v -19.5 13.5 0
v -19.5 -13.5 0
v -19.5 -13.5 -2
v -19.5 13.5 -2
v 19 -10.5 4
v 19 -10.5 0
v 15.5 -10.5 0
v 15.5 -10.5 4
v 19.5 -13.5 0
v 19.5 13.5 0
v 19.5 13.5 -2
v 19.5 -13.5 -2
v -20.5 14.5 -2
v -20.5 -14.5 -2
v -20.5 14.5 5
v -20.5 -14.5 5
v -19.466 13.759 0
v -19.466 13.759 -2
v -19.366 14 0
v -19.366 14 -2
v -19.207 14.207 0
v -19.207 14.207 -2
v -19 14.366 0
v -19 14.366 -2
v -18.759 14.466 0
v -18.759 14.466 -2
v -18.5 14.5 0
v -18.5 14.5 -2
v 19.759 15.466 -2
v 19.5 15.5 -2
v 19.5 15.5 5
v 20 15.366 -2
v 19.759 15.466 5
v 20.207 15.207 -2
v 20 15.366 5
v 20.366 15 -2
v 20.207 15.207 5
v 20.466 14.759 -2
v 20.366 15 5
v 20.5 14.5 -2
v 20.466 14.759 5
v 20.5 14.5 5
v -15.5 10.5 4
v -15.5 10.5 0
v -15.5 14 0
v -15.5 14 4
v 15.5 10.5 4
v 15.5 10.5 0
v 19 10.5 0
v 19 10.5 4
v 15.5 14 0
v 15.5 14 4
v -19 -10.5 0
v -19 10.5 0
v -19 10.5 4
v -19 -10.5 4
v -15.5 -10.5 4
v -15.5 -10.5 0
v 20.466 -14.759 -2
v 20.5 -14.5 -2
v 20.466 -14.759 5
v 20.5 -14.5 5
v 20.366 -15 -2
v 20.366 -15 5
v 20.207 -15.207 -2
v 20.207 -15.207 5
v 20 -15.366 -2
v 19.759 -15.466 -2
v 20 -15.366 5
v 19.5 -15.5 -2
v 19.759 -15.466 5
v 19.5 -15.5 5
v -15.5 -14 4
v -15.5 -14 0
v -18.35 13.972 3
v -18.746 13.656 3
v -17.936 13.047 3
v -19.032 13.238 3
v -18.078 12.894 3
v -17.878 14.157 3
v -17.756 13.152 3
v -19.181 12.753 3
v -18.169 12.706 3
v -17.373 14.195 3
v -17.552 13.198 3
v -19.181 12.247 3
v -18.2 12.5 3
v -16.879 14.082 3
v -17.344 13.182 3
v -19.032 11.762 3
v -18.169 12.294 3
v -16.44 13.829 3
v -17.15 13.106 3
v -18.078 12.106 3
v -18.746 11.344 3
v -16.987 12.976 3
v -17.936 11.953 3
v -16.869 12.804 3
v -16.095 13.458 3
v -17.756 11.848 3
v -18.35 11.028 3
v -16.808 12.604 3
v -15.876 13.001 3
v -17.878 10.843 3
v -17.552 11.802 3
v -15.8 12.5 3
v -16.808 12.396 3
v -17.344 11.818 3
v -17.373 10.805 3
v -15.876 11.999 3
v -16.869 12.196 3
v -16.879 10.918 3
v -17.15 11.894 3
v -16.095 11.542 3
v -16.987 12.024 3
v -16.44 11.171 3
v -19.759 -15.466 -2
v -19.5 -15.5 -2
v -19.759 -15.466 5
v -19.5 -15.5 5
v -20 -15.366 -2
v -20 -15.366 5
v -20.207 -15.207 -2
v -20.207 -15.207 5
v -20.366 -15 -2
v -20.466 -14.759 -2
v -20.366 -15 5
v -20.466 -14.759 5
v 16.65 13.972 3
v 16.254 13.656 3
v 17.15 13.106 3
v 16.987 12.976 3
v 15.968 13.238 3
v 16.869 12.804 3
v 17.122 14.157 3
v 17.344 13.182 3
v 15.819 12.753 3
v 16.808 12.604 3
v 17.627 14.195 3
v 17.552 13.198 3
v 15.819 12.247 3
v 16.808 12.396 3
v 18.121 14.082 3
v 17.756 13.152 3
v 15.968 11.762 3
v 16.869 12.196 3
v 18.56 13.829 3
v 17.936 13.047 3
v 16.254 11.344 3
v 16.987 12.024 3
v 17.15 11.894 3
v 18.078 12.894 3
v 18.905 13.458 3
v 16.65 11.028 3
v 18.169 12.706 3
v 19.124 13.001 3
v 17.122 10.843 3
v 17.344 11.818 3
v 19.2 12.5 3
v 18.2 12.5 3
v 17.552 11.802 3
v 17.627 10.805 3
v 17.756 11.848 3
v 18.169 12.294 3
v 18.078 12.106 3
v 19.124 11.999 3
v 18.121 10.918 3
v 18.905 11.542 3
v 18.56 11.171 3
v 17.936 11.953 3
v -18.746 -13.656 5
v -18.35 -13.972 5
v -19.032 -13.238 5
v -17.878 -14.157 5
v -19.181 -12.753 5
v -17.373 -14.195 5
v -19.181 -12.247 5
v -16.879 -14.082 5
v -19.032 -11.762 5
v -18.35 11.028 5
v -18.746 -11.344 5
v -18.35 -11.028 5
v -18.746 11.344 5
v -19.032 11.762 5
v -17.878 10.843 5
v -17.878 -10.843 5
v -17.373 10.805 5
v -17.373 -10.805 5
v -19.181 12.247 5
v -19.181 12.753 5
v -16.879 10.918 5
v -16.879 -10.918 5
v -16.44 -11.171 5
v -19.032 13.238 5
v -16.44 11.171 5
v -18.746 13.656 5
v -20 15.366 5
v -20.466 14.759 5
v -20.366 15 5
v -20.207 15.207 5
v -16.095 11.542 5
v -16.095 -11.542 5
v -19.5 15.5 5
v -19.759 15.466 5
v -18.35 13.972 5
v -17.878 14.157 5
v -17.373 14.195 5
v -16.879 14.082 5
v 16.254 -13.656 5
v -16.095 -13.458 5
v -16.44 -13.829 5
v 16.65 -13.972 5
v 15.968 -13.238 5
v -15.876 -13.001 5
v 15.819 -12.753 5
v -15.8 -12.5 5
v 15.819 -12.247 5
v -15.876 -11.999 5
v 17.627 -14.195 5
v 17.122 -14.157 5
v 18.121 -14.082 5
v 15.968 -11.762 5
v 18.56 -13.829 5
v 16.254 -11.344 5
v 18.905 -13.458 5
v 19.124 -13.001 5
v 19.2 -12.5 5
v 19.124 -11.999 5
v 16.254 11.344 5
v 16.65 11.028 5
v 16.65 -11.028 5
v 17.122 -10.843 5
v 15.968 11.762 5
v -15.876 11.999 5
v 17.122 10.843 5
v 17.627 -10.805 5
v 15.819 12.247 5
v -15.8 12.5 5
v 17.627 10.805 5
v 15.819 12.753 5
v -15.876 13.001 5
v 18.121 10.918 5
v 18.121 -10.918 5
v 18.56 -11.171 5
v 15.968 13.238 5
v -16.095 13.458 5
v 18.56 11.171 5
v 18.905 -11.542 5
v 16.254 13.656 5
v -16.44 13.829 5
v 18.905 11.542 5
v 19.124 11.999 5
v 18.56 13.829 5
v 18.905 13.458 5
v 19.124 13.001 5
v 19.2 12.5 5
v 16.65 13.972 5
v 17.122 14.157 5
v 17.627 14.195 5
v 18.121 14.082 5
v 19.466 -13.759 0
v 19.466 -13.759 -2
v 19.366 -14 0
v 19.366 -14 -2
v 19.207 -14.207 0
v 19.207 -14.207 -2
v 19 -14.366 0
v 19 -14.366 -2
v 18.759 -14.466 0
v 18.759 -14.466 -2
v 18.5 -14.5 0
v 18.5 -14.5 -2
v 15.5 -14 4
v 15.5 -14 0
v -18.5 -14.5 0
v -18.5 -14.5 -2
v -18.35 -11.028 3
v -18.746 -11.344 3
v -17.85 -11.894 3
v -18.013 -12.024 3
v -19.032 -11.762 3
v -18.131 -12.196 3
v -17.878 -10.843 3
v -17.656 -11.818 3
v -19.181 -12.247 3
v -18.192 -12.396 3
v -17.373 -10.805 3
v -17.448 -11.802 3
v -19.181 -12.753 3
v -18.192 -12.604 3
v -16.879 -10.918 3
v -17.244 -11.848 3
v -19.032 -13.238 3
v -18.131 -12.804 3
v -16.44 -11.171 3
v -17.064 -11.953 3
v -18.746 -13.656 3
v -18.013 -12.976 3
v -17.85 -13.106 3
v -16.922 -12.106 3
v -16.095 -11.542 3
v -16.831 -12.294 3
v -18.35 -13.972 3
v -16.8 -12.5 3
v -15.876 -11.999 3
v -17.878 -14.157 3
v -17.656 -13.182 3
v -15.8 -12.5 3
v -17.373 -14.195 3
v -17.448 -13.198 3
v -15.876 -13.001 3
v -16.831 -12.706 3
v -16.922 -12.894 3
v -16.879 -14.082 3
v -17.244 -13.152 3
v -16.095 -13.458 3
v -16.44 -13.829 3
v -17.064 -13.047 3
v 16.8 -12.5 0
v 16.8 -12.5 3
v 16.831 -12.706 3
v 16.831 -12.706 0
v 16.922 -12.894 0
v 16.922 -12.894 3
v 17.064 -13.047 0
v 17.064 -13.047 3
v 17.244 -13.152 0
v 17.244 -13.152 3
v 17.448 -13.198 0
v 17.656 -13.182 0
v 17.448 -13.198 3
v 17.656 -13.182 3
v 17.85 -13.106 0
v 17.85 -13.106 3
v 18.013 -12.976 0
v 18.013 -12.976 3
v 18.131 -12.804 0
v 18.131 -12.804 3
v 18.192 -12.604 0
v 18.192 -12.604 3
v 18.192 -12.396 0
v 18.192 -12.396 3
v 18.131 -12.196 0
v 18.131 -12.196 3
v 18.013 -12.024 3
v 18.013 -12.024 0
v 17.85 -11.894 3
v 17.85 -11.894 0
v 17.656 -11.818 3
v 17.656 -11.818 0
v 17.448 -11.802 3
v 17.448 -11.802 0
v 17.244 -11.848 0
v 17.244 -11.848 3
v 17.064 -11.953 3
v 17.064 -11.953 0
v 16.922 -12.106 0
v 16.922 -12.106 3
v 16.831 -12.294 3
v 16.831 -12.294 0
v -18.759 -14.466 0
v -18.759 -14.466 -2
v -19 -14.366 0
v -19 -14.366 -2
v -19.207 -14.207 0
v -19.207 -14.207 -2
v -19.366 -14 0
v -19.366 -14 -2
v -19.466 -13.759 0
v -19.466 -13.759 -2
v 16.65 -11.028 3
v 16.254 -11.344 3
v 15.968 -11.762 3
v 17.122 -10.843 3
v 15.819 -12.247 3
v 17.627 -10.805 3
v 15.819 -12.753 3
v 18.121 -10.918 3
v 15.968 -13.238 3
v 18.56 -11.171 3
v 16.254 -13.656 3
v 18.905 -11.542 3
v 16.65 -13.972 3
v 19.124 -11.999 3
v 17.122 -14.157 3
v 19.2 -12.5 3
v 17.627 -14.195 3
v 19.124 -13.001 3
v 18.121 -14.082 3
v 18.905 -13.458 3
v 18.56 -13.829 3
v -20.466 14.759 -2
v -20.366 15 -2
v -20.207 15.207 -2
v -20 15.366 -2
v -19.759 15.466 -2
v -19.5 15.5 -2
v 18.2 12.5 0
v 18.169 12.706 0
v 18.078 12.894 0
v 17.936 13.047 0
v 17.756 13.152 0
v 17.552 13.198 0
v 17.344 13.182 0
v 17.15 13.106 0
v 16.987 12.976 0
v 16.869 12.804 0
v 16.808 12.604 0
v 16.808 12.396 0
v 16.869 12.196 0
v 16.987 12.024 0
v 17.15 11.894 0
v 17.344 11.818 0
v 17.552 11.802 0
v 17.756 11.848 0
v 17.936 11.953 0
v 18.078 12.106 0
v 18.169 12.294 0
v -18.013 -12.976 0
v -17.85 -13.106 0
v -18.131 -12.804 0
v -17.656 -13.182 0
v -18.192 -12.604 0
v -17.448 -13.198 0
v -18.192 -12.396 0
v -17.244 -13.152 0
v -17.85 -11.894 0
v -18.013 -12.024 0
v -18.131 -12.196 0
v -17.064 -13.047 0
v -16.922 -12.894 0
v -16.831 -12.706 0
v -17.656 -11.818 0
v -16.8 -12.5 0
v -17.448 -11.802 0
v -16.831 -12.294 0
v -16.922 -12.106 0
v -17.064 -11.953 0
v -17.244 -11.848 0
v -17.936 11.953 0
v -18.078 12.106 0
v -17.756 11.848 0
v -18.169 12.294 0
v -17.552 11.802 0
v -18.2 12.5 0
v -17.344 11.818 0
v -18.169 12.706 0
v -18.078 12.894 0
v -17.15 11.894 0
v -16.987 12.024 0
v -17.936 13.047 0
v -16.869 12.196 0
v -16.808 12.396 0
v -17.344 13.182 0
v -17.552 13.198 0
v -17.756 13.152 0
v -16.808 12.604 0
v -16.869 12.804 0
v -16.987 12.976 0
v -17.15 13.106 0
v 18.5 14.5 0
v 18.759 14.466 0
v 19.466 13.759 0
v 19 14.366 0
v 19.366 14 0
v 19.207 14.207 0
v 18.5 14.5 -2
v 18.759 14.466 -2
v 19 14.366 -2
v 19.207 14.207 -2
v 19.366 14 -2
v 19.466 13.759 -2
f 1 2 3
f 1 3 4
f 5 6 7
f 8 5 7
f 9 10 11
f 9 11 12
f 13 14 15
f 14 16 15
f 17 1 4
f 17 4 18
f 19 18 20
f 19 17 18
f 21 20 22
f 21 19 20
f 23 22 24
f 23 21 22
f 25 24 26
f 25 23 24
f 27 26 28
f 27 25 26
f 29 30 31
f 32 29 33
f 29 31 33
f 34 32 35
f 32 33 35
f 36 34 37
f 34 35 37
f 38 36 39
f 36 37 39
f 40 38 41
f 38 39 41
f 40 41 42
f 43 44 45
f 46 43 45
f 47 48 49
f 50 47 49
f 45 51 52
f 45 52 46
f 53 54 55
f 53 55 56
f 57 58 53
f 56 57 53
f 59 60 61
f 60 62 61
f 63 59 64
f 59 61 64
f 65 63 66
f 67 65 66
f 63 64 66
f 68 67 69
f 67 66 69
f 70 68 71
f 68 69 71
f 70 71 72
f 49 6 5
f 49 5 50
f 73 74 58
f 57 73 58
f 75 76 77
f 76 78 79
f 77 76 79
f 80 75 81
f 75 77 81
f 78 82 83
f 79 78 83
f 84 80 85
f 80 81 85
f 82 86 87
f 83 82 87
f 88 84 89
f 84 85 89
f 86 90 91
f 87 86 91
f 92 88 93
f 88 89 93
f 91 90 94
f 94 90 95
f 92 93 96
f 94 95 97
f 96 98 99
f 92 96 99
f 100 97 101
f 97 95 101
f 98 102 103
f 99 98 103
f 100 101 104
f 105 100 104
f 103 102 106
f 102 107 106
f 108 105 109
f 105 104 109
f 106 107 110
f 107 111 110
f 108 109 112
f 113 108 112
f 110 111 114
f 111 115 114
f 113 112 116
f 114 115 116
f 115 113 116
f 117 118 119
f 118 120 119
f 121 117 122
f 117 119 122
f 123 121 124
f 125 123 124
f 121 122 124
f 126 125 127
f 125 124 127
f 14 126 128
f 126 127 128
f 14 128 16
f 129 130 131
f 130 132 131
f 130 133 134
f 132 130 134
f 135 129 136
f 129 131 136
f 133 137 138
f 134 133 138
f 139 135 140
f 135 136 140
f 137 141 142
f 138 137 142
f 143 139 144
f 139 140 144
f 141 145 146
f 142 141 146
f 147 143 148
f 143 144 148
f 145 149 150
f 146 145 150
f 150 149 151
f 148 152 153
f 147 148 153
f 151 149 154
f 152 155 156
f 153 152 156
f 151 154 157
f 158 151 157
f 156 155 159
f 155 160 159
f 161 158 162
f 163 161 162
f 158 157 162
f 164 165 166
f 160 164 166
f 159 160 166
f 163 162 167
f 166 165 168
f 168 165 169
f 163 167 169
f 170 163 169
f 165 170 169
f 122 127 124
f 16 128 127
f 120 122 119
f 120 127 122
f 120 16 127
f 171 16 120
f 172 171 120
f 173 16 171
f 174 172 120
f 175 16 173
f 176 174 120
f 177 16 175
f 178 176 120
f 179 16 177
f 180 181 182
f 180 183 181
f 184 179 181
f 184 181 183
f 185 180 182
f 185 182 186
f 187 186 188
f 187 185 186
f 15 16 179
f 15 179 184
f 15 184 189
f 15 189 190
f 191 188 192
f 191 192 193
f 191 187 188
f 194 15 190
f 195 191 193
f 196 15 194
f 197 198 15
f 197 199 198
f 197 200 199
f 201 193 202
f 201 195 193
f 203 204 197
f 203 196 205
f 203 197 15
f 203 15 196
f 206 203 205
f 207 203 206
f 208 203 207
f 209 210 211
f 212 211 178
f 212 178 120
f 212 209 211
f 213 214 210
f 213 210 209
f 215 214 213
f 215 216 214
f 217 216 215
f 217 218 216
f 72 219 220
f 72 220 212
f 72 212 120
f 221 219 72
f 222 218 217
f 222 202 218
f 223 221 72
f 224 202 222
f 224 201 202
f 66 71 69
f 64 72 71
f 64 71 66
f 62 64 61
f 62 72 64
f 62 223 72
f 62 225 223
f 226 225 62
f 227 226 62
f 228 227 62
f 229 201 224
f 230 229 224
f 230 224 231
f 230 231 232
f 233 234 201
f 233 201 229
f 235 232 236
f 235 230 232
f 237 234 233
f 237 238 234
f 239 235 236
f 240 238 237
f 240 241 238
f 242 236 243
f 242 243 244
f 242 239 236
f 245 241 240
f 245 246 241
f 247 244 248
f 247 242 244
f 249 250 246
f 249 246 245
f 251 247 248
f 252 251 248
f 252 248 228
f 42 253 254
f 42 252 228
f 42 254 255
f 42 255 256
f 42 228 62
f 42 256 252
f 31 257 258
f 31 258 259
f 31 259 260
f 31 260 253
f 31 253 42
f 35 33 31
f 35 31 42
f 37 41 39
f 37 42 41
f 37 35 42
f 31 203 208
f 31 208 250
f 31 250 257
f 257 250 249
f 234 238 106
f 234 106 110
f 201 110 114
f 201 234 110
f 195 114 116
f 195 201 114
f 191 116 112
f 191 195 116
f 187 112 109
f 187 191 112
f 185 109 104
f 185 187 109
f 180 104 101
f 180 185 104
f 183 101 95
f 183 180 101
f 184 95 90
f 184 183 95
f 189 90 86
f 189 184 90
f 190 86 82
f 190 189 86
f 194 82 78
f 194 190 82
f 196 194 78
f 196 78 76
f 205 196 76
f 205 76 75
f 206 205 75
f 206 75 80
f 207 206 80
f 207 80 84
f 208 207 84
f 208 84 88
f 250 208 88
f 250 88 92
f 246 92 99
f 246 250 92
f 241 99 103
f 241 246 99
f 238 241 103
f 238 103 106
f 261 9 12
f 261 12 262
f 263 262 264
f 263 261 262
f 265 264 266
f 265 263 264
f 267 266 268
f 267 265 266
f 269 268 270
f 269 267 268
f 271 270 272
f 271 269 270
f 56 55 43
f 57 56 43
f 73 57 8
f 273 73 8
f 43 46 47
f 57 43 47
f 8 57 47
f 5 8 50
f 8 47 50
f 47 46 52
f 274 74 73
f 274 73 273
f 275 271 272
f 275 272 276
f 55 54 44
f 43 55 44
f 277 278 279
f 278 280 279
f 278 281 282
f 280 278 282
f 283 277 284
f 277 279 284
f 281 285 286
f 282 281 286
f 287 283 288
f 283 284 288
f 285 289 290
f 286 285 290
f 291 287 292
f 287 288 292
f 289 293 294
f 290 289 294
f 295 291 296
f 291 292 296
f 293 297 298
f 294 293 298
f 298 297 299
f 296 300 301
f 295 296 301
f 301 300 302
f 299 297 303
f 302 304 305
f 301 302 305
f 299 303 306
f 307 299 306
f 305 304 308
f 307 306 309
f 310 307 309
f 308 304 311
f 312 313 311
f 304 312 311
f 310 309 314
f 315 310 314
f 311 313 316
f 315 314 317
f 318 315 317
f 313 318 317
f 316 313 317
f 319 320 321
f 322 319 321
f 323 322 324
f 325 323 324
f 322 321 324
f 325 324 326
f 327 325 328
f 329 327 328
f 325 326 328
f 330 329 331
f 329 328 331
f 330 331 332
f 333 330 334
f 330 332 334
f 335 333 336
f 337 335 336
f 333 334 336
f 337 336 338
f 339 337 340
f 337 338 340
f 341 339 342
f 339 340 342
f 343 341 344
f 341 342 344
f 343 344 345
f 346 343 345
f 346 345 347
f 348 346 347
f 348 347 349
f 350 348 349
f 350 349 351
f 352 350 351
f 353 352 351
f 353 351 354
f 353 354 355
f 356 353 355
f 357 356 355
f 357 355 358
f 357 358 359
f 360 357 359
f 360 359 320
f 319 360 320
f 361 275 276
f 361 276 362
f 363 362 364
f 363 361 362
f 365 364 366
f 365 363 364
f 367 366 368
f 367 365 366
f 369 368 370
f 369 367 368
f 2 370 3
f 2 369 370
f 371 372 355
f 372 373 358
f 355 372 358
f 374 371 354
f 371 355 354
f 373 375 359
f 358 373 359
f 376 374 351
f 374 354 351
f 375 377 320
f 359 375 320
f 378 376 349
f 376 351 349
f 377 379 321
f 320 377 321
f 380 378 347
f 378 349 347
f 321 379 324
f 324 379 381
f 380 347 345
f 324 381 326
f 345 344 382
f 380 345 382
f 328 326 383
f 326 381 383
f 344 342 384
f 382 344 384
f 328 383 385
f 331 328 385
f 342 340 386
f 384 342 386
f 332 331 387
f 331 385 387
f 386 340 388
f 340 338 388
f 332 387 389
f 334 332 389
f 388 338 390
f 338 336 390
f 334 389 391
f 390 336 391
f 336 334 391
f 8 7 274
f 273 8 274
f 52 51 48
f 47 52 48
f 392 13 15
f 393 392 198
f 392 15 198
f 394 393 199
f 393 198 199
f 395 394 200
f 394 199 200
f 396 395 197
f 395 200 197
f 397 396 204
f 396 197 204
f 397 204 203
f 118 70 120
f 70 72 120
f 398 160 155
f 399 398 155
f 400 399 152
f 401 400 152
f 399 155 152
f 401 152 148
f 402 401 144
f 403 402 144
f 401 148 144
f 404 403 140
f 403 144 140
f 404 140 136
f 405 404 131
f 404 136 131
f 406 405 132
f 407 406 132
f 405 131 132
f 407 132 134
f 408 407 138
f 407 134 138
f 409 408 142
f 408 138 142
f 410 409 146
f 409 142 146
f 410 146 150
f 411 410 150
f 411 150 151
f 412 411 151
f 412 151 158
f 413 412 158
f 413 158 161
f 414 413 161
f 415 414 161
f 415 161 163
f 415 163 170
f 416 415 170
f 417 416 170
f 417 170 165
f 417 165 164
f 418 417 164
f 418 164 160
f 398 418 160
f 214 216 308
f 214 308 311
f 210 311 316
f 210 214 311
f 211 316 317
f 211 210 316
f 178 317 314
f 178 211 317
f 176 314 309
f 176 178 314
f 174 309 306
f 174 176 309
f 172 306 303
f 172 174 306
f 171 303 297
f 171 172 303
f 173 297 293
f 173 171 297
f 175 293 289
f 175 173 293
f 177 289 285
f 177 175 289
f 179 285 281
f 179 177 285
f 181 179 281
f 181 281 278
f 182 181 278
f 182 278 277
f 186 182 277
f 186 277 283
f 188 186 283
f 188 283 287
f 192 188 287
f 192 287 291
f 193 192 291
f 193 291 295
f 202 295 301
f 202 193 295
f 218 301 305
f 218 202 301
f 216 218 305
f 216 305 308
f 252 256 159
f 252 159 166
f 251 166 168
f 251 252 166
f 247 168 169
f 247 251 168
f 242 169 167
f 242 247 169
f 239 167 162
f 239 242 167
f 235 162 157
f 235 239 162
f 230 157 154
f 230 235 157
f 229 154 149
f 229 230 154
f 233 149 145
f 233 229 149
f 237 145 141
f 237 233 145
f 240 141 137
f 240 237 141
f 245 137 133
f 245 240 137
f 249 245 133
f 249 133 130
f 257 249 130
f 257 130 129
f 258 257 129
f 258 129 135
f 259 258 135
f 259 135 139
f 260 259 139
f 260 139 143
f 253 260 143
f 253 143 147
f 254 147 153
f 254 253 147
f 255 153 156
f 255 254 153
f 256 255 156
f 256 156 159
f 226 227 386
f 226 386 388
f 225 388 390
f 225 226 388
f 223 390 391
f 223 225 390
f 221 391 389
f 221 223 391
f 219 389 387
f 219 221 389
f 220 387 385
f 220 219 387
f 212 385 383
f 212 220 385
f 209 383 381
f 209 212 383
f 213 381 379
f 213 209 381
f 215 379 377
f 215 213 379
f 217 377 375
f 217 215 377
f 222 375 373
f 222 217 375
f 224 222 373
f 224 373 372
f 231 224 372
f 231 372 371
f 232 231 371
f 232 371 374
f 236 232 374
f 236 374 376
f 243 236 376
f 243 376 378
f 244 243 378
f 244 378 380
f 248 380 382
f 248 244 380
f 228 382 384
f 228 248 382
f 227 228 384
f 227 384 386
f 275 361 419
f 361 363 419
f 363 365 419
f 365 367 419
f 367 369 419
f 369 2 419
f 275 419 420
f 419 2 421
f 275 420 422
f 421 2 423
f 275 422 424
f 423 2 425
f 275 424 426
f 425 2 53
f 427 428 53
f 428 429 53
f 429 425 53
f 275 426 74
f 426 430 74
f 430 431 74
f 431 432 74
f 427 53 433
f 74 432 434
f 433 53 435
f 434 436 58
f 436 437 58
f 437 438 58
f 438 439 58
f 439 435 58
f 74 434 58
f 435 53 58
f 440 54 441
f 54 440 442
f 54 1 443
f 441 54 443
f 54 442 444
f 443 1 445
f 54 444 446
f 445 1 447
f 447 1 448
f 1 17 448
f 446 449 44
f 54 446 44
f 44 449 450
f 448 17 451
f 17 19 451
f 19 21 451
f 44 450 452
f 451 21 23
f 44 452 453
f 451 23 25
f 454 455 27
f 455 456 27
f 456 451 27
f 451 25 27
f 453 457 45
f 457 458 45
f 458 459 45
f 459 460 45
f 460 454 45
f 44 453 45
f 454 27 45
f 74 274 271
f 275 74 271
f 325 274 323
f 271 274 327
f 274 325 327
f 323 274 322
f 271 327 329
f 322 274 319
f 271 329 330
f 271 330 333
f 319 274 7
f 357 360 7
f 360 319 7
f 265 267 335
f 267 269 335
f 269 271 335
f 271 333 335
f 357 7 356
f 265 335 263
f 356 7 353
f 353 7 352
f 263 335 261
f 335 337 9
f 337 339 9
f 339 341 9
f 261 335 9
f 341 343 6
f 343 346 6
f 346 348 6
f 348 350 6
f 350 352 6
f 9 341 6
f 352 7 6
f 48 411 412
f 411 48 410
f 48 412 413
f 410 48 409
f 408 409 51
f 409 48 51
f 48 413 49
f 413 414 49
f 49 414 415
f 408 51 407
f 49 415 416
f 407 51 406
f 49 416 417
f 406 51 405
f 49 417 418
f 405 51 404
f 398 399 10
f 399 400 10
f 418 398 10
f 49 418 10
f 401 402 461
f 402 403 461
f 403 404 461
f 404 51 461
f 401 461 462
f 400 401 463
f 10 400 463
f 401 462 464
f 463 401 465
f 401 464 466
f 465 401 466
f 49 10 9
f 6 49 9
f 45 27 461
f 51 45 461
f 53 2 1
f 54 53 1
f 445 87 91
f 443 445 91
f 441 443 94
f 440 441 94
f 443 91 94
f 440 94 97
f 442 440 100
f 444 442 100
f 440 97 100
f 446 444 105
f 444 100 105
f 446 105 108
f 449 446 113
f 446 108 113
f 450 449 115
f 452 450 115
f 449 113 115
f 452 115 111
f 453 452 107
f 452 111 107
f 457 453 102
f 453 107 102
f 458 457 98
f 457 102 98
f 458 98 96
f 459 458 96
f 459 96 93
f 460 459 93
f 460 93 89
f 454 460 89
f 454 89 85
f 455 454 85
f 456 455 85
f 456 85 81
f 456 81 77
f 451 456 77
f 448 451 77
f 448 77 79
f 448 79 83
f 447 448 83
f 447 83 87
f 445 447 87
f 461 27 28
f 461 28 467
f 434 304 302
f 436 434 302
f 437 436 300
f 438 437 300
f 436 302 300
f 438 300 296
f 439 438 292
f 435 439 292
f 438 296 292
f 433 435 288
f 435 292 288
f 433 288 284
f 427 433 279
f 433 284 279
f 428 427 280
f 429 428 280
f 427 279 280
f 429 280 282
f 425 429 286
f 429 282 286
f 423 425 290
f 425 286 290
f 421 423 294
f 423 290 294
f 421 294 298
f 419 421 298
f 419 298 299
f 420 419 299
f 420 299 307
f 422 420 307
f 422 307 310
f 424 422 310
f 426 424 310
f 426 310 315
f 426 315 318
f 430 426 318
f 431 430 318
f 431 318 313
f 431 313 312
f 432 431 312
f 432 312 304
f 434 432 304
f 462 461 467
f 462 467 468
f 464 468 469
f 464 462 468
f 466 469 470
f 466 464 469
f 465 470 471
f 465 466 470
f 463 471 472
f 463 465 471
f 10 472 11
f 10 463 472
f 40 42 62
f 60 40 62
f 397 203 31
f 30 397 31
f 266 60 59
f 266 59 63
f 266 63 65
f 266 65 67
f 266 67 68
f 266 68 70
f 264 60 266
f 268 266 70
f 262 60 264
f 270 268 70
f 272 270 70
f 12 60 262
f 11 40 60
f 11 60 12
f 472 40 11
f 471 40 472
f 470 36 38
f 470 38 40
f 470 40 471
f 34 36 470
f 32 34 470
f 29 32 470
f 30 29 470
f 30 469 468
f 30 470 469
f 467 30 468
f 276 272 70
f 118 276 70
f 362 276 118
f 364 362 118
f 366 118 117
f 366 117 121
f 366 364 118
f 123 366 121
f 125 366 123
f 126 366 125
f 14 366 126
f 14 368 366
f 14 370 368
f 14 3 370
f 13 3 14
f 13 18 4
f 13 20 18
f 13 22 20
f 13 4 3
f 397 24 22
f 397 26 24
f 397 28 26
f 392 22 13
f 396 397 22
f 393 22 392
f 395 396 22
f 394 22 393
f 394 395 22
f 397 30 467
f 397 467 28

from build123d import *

# Parameters (mm, degrees)
SKETCH_1_W          = 41
SKETCH_1_H          = 31
SKETCH_1_W_2        = 31
SKETCH_1_H_2        = 21
EXTRUDE_1_DEPTH     = 4
SKETCH_2_W          = 41
SKETCH_2_H          = 31
EXTRUDE_1_2_DEPTH   = 1
CUT_EXTRUDE_START   = -5
SKETCH_3_R          = 1.7
CUT_EXTRUDE_1_DEPTH = 2
SKETCH_4_R          = 0.7
CUT_EXTRUDE_2_DEPTH = 26.874698066
FILLET_1_R          = 1
CUT_EXTRUDE_3_DEPTH = 4
EXTRUDE_2_DEPTH     = 2


with BuildPart() as part:
    # 草图1 → Extrude 1 (new body)
    with BuildSketch(Plane.XY):
        Rectangle(SKETCH_1_W, SKETCH_1_H)
        Rectangle(SKETCH_1_W_2, SKETCH_1_H_2, mode=Mode.SUBTRACT)
    extrude(amount=EXTRUDE_1_DEPTH)

    # 草图2 → Extrude 1 2 (add)
    with BuildSketch(Plane.XY.offset(4)):
        Rectangle(SKETCH_2_W, SKETCH_2_H)
    extrude(amount=EXTRUDE_1_2_DEPTH)

    # 草图3 → 切除-拉伸1 (cut)
    with BuildSketch(Plane(origin=(0, 0, 0), x_dir=(-1, 0, 0), z_dir=(0, 0, -1)).offset(CUT_EXTRUDE_START)):
        with Locations(Location((17.5, 12.5, 0), (0, 0, 180))):
            Circle(SKETCH_3_R)
        with Locations(Location((-17.5, 12.5, 0), (0, 0, 180))):
            Circle(SKETCH_3_R)
        with Locations(Location((17.5, -12.5, 0), (0, 0, 180))):
            Circle(SKETCH_3_R)
        with Locations(Location((-17.5, -12.5, 0), (0, 0, 180))):
            Circle(SKETCH_3_R)
    extrude(amount=CUT_EXTRUDE_1_DEPTH, mode=Mode.SUBTRACT)

    # 草图4 → 切除-拉伸2 (cut, through all)
    with BuildSketch(Plane.XY.offset(3)):
        with Locations((17.5, 12.5)):
            Circle(SKETCH_4_R)
        with Locations(Location((-17.5, 12.5, 0), (0, 0, 180))):
            Circle(SKETCH_4_R)
        with Locations(Location((17.5, -12.5, 0), (0, 0, 180))):
            Circle(SKETCH_4_R)
        with Locations((-17.5, -12.5)):
            Circle(SKETCH_4_R)
    extrude(amount=-CUT_EXTRUDE_2_DEPTH, mode=Mode.SUBTRACT)

    # 圆角1
    fillet_1_edges = [part.edges().sort_by_distance(p)[0] for p in [
        (20.5, -15.5, 2.5),
        (-20.5, -15.5, 2.5),
        (-20.5, 15.5, 2.5),
        (20.5, 15.5, 2.5),
    ]]
    fillet(fillet_1_edges, radius=FILLET_1_R)

    # 草图5 → 切除-拉伸3 (cut)
    with BuildSketch(Plane(origin=(0, 0, 0), x_dir=(-1, 0, 0), z_dir=(0, 0, -1))):
        Polygon((-15.5, 10.5), (-15.5, 12.5), (-15.5, 14), (15.5, 14), (15.5, 12.5), (15.5, 10.5), (17.5, 10.5), (19, 10.5), (19, -10.5), (17.5, -10.5), (15.5, -10.5), (15.5, -12.5), (15.5, -14), (-15.5, -14), (-15.5, -12.5), (-15.5, -10.5), (-17.5, -10.5), (-19, -10.5), (-19, 10.5), (-17.5, 10.5), align=None)
    extrude(amount=-CUT_EXTRUDE_3_DEPTH, mode=Mode.SUBTRACT)

    # 草图7 → 凸台-拉伸2 (add)
    with BuildSketch(Plane(origin=(0, 0, 0), x_dir=(-1, 0, 0), z_dir=(0, 0, -1))):
        with BuildLine():
            Line((-20.5, 14.5), (-20.5, -14.5))
            ThreePointArc((-20.5, -14.5), (-20.207106781, -15.207106781), (-19.5, -15.5))
            Line((-19.5, -15.5), (19.5, -15.5))
            ThreePointArc((19.5, -15.5), (20.207106781, -15.207106781), (20.5, -14.5))
            Line((20.5, -14.5), (20.5, 14.5))
            ThreePointArc((20.5, 14.5), (20.207106781, 15.207106781), (19.5, 15.5))
            Line((19.5, 15.5), (-19.5, 15.5))
            ThreePointArc((-19.5, 15.5), (-20.207106781, 15.207106781), (-20.5, 14.5))
        make_face()
        with BuildLine():
            Line((-19.5, 13.5), (-19.5, -13.5))
            ThreePointArc((-19.5, -13.5), (-19.207106781, -14.207106781), (-18.5, -14.5))
            Line((-18.5, -14.5), (18.5, -14.5))
            ThreePointArc((18.5, -14.5), (19.207106781, -14.207106781), (19.5, -13.5))
            Line((19.5, -13.5), (19.5, 13.5))
            ThreePointArc((19.5, 13.5), (19.207106781, 14.207106781), (18.5, 14.5))
            Line((18.5, 14.5), (-18.5, 14.5))
            ThreePointArc((-18.5, 14.5), (-19.207106781, 14.207106781), (-19.5, 13.5))
        make_face(mode=Mode.SUBTRACT)
    extrude(amount=EXTRUDE_2_DEPTH)


solid = part.part
